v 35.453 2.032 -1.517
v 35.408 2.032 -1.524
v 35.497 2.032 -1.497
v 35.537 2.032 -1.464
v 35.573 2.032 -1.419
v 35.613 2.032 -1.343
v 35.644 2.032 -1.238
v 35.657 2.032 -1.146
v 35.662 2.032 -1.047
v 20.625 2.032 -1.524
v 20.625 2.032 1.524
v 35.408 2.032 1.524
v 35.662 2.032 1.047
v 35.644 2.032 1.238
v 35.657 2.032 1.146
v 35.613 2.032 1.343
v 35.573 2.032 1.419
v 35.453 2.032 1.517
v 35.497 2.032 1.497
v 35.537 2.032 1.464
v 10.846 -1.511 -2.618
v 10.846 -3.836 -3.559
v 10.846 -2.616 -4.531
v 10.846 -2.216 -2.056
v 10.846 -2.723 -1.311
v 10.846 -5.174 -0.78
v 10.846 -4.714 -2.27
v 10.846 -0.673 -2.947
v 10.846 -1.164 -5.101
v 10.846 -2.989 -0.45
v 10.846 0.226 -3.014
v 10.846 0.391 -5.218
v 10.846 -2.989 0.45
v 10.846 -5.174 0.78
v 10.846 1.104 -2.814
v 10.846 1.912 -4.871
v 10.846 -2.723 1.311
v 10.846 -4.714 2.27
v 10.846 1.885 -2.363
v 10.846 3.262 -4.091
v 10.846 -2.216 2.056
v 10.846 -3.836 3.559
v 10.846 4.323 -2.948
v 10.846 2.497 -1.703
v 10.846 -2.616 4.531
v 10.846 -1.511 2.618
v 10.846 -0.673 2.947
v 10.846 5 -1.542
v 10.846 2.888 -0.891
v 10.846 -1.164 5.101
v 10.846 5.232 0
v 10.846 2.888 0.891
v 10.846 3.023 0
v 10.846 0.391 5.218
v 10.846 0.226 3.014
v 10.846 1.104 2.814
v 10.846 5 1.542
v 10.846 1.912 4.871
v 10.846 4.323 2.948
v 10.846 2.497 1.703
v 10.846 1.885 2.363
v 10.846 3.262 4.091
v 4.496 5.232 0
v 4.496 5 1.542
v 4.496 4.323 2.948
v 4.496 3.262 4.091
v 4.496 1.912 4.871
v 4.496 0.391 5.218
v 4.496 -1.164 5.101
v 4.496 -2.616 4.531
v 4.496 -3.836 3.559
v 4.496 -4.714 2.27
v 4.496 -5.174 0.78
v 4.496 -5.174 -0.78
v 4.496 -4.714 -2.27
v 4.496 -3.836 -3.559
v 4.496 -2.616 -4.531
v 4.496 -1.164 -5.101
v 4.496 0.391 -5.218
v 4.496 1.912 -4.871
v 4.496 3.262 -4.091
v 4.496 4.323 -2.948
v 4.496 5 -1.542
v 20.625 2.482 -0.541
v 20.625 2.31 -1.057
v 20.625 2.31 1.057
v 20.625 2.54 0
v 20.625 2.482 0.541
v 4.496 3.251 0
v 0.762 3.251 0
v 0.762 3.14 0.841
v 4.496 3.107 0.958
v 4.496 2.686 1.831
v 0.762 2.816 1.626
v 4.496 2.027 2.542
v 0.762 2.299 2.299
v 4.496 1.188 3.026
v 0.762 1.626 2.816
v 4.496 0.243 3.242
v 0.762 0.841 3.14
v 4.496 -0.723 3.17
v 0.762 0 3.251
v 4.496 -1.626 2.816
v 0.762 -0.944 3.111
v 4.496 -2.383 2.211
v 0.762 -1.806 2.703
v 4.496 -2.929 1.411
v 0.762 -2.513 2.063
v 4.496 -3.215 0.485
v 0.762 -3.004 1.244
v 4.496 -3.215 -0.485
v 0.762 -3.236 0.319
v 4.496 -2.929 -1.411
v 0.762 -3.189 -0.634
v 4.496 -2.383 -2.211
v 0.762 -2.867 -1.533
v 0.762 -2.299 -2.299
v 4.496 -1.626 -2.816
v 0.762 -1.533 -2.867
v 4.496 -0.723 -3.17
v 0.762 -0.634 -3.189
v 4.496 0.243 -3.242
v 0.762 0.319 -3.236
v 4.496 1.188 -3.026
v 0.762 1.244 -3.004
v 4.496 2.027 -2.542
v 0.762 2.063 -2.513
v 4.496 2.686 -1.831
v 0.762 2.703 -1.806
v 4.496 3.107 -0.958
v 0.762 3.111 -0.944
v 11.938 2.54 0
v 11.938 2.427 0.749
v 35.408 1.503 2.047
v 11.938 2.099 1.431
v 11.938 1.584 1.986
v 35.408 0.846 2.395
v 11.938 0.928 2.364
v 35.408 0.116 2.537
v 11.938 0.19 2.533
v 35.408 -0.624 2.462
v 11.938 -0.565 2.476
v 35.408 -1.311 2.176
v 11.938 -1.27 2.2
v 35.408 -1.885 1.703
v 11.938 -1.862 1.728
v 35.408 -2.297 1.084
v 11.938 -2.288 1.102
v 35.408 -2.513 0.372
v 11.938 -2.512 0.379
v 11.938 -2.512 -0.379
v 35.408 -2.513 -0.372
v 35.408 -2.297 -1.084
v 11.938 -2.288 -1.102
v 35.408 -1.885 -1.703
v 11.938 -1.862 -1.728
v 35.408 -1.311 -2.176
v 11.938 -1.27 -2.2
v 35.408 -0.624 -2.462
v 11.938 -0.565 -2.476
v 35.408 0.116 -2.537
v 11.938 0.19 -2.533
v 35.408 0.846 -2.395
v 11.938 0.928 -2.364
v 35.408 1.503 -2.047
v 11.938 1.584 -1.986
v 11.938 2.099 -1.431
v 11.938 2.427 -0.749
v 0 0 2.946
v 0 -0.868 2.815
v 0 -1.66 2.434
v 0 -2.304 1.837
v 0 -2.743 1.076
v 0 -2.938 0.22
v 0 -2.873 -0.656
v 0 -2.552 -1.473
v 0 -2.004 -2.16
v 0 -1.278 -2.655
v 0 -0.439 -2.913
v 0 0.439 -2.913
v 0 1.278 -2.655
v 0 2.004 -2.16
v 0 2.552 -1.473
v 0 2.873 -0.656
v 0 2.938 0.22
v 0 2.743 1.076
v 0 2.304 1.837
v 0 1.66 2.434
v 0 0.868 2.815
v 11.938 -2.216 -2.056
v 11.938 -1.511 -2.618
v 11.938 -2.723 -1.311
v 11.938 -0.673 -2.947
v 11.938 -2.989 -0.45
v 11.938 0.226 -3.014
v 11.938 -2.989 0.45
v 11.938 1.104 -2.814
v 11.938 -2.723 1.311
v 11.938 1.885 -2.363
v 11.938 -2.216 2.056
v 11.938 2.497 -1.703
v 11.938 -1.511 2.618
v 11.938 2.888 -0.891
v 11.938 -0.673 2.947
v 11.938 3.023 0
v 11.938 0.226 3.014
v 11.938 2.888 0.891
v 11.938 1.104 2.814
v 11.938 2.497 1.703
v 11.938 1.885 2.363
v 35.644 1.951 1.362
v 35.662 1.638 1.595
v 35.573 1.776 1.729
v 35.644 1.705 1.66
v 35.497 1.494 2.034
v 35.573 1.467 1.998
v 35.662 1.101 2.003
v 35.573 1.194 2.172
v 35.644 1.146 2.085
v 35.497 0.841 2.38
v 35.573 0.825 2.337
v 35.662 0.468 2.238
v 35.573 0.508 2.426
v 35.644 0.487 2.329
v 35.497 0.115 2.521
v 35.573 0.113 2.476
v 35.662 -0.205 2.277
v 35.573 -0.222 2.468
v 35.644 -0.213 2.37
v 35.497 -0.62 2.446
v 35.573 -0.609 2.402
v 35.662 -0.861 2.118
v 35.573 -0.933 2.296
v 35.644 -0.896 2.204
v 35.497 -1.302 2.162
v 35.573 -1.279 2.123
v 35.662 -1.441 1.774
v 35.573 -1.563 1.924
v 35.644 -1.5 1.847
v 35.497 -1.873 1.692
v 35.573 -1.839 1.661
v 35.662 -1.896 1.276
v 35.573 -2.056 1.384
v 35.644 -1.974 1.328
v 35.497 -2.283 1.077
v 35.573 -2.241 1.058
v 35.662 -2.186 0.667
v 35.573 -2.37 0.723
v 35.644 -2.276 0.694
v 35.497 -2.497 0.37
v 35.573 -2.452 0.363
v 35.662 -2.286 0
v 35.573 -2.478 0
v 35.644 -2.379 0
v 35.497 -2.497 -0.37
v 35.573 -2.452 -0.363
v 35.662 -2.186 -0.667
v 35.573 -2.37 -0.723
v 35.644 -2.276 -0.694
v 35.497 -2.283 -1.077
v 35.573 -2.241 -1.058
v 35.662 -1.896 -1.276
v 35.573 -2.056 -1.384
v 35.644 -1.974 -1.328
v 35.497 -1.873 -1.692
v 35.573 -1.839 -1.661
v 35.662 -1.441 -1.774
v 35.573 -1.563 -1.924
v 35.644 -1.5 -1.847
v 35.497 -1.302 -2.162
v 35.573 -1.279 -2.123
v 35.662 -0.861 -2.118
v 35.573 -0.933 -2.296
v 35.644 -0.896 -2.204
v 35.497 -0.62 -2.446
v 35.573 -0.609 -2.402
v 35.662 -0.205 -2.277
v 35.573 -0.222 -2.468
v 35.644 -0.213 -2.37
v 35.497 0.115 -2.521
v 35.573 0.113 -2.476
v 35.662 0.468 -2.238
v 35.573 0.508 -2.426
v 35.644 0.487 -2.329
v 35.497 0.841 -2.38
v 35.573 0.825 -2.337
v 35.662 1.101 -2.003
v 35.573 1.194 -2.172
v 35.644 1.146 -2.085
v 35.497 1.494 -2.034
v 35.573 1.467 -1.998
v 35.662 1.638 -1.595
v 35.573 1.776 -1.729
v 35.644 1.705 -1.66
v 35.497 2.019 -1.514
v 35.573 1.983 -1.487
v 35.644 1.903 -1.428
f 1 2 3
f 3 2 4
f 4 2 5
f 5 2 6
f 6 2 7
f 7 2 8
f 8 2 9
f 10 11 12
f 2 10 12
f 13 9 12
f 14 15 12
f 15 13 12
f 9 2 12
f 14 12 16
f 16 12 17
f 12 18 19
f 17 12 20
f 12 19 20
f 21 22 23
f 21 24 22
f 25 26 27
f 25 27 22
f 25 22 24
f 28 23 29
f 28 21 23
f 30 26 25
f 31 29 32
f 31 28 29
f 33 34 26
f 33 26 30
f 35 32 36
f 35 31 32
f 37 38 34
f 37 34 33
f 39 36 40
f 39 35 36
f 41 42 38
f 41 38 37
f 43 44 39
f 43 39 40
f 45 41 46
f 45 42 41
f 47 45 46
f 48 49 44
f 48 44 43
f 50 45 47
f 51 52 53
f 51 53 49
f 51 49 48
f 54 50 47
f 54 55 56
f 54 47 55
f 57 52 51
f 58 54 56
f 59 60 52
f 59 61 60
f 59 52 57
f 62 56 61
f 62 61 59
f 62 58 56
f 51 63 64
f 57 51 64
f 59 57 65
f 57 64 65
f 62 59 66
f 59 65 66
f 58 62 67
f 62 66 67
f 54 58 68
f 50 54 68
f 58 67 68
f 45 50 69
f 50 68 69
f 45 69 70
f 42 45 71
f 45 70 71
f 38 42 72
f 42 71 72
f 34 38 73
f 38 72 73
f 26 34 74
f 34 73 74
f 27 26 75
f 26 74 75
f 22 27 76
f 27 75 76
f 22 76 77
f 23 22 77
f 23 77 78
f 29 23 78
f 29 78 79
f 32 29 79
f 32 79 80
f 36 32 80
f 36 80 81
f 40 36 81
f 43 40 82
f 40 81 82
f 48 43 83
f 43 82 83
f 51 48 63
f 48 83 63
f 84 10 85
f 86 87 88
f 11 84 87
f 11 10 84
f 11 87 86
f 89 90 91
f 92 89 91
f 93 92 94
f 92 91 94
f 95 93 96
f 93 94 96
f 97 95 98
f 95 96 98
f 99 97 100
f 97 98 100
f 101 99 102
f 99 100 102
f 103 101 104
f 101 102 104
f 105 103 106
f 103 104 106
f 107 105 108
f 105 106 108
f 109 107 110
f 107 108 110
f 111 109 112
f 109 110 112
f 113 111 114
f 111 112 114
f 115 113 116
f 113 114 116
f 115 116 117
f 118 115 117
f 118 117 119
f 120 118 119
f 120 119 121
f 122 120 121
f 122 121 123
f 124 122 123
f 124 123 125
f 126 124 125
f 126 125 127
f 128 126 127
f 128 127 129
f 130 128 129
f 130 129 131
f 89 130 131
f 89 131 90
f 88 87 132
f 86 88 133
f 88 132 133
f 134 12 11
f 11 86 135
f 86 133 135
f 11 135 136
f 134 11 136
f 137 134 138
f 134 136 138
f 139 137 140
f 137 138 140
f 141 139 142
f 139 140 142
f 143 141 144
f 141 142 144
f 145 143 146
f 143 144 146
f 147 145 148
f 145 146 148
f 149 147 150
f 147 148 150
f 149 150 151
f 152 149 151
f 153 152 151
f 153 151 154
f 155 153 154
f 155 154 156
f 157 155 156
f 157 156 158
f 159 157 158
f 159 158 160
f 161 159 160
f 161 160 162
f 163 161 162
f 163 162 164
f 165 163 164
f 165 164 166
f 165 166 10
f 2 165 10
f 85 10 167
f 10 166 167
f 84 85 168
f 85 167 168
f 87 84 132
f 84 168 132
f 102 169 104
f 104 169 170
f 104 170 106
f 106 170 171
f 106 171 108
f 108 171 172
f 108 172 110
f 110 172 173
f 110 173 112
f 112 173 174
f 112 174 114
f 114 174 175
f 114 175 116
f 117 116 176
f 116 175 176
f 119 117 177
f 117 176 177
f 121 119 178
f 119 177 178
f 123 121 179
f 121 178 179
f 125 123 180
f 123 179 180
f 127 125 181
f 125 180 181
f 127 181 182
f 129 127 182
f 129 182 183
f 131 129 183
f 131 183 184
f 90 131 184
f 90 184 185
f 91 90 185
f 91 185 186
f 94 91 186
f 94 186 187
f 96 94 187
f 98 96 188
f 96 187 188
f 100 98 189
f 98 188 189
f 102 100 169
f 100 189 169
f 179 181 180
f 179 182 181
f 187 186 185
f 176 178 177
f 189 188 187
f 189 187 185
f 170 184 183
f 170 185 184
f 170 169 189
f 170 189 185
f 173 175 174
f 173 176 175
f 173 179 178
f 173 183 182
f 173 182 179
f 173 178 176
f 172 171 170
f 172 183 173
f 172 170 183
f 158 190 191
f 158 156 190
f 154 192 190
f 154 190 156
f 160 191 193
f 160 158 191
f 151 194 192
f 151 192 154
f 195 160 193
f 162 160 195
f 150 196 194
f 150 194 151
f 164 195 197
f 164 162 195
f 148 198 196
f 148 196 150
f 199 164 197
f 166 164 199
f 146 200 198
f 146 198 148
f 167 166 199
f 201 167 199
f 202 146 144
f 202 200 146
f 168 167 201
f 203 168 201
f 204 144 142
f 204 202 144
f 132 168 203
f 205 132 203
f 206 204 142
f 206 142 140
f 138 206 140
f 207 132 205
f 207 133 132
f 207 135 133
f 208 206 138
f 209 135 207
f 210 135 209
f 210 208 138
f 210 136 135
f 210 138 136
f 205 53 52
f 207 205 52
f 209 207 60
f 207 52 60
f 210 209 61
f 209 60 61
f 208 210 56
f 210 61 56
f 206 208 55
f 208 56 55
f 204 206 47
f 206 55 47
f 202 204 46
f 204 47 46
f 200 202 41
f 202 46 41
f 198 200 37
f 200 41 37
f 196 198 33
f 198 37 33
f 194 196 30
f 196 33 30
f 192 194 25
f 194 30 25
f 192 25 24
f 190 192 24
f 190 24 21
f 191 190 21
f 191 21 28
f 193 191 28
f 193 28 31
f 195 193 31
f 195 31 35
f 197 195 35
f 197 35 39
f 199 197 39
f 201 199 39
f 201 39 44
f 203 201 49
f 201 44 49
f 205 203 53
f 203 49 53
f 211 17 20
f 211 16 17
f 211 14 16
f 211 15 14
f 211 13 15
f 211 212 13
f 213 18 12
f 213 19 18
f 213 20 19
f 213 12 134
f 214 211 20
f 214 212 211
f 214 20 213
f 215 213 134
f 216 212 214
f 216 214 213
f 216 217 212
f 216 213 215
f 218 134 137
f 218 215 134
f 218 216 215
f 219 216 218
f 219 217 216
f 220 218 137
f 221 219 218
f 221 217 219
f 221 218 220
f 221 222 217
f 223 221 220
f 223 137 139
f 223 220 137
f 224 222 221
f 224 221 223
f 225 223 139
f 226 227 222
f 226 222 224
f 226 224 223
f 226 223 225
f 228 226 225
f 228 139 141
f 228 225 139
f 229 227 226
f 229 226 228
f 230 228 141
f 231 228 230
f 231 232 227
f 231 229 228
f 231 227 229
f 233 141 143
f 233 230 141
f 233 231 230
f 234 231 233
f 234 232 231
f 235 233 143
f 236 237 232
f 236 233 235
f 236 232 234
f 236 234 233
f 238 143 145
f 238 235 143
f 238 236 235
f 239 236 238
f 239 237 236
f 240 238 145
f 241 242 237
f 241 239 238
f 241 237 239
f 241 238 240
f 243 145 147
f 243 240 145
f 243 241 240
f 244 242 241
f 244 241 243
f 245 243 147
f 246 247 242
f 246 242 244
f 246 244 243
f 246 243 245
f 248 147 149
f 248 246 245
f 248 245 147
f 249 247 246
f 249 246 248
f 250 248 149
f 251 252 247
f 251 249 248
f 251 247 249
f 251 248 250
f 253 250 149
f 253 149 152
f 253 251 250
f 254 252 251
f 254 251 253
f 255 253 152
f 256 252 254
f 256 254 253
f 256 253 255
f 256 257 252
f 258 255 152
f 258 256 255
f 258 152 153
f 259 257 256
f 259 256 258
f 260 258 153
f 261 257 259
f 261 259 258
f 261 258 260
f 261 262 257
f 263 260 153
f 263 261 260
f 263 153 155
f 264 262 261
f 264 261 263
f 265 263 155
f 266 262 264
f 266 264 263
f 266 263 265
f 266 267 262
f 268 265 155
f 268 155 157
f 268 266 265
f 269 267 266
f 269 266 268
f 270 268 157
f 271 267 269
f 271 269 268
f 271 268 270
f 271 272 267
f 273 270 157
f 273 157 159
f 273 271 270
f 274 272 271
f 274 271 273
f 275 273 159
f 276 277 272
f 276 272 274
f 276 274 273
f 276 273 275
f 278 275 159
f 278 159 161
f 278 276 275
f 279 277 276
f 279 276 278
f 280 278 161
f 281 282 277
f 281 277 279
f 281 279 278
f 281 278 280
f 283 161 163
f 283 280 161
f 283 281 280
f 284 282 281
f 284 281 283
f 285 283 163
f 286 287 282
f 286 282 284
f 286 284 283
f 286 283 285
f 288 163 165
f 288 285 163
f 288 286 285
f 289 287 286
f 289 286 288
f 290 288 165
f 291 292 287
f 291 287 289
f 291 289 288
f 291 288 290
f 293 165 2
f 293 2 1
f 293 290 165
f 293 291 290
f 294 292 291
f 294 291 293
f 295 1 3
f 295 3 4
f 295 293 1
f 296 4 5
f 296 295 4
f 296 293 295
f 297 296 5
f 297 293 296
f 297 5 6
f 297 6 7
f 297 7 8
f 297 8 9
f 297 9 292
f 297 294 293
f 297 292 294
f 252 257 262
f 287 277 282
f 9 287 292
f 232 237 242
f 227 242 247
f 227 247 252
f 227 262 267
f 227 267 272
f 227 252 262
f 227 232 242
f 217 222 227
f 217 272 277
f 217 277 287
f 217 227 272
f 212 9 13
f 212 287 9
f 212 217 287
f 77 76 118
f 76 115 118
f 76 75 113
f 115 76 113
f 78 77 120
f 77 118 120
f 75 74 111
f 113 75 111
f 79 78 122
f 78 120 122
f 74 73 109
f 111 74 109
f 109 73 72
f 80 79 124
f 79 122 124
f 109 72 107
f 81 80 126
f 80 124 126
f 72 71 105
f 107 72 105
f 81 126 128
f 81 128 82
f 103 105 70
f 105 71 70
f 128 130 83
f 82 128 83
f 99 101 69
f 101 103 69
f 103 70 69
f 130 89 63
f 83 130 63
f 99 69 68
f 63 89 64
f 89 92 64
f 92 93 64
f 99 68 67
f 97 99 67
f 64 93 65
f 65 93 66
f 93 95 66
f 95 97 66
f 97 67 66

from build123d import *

# Parameters (mm, degrees)
F0_R      = 3.2512
F1_DEPTH  = 4.4958
F2_R      = 5.2324
F3_DEPTH  = 6.35
F4_R      = 3.0226
F5_DEPTH  = 1.0922
F6_R      = 2.54
F7_DEPTH  = 23.7236
F9_W      = 15.0368
F9_H      = 0.508
F10_DEPTH = 7.7734
F11_R     = 0.254
F12_R     = 3.2512
F13_DEPTH = 0.762
F14_R     = 2.9464
F15_DEPTH = 0.762


with BuildPart() as f1:
    # F0 (on Right) → F1 (new body)
    with BuildSketch(Plane.YZ):
        Circle(F0_R)
    extrude(amount=F1_DEPTH)

    # F2 (on face) → F3 (join)
    with BuildSketch(Plane.YZ.offset(4.4958)):
        Circle(F2_R)
    extrude(amount=F3_DEPTH)

    # F4 (on face) → F5 (join)
    with BuildSketch(Plane.YZ.offset(10.8458)):
        Circle(F4_R)
    extrude(amount=F5_DEPTH)

    # F6 (on face) → F7 (join)
    with BuildSketch(Plane.YZ.offset(11.938)):
        Circle(F6_R)
    extrude(amount=F7_DEPTH)

    # F9 (on offset) → F10 (cut, through all)
    with BuildSketch(Plane.XY.offset(2.54)):
        with Locations((28.1432, 2.286)):
            Rectangle(F9_W, F9_H)
    extrude(amount=-F10_DEPTH, mode=Mode.SUBTRACT)

    # F11
    f11_edges = [f1.edges().sort_by_distance(p)[0] for p in [
        (35.6616, -2.54, 0),
    ]]
    fillet(f11_edges, radius=F11_R)

    # F12 (on face) → F13 (cut)
    with BuildSketch(Plane(origin=(0, 0, 0), x_dir=(0, -1, 0), z_dir=(-1, 0, 0))):
        Circle(F12_R)
    extrude(amount=-F13_DEPTH, mode=Mode.SUBTRACT)

    # F14 (on face) → F15 (join)
    with BuildSketch(Plane(origin=(0.762, 0, 0), x_dir=(0, -1, 0), z_dir=(-1, 0, 0))):
        Circle(F14_R)
    extrude(amount=F15_DEPTH)

    # F16 (on Front) → F17 (revolve)
    with BuildSketch(Plane.XZ):
        Polygon((0, 2.9464), (0.762, 2.9464), (0.762, 3.2512), align=None)
    revolve(axis=Axis((0.381, 0, 0), (1, 0, 0)))


solid = f1.part
